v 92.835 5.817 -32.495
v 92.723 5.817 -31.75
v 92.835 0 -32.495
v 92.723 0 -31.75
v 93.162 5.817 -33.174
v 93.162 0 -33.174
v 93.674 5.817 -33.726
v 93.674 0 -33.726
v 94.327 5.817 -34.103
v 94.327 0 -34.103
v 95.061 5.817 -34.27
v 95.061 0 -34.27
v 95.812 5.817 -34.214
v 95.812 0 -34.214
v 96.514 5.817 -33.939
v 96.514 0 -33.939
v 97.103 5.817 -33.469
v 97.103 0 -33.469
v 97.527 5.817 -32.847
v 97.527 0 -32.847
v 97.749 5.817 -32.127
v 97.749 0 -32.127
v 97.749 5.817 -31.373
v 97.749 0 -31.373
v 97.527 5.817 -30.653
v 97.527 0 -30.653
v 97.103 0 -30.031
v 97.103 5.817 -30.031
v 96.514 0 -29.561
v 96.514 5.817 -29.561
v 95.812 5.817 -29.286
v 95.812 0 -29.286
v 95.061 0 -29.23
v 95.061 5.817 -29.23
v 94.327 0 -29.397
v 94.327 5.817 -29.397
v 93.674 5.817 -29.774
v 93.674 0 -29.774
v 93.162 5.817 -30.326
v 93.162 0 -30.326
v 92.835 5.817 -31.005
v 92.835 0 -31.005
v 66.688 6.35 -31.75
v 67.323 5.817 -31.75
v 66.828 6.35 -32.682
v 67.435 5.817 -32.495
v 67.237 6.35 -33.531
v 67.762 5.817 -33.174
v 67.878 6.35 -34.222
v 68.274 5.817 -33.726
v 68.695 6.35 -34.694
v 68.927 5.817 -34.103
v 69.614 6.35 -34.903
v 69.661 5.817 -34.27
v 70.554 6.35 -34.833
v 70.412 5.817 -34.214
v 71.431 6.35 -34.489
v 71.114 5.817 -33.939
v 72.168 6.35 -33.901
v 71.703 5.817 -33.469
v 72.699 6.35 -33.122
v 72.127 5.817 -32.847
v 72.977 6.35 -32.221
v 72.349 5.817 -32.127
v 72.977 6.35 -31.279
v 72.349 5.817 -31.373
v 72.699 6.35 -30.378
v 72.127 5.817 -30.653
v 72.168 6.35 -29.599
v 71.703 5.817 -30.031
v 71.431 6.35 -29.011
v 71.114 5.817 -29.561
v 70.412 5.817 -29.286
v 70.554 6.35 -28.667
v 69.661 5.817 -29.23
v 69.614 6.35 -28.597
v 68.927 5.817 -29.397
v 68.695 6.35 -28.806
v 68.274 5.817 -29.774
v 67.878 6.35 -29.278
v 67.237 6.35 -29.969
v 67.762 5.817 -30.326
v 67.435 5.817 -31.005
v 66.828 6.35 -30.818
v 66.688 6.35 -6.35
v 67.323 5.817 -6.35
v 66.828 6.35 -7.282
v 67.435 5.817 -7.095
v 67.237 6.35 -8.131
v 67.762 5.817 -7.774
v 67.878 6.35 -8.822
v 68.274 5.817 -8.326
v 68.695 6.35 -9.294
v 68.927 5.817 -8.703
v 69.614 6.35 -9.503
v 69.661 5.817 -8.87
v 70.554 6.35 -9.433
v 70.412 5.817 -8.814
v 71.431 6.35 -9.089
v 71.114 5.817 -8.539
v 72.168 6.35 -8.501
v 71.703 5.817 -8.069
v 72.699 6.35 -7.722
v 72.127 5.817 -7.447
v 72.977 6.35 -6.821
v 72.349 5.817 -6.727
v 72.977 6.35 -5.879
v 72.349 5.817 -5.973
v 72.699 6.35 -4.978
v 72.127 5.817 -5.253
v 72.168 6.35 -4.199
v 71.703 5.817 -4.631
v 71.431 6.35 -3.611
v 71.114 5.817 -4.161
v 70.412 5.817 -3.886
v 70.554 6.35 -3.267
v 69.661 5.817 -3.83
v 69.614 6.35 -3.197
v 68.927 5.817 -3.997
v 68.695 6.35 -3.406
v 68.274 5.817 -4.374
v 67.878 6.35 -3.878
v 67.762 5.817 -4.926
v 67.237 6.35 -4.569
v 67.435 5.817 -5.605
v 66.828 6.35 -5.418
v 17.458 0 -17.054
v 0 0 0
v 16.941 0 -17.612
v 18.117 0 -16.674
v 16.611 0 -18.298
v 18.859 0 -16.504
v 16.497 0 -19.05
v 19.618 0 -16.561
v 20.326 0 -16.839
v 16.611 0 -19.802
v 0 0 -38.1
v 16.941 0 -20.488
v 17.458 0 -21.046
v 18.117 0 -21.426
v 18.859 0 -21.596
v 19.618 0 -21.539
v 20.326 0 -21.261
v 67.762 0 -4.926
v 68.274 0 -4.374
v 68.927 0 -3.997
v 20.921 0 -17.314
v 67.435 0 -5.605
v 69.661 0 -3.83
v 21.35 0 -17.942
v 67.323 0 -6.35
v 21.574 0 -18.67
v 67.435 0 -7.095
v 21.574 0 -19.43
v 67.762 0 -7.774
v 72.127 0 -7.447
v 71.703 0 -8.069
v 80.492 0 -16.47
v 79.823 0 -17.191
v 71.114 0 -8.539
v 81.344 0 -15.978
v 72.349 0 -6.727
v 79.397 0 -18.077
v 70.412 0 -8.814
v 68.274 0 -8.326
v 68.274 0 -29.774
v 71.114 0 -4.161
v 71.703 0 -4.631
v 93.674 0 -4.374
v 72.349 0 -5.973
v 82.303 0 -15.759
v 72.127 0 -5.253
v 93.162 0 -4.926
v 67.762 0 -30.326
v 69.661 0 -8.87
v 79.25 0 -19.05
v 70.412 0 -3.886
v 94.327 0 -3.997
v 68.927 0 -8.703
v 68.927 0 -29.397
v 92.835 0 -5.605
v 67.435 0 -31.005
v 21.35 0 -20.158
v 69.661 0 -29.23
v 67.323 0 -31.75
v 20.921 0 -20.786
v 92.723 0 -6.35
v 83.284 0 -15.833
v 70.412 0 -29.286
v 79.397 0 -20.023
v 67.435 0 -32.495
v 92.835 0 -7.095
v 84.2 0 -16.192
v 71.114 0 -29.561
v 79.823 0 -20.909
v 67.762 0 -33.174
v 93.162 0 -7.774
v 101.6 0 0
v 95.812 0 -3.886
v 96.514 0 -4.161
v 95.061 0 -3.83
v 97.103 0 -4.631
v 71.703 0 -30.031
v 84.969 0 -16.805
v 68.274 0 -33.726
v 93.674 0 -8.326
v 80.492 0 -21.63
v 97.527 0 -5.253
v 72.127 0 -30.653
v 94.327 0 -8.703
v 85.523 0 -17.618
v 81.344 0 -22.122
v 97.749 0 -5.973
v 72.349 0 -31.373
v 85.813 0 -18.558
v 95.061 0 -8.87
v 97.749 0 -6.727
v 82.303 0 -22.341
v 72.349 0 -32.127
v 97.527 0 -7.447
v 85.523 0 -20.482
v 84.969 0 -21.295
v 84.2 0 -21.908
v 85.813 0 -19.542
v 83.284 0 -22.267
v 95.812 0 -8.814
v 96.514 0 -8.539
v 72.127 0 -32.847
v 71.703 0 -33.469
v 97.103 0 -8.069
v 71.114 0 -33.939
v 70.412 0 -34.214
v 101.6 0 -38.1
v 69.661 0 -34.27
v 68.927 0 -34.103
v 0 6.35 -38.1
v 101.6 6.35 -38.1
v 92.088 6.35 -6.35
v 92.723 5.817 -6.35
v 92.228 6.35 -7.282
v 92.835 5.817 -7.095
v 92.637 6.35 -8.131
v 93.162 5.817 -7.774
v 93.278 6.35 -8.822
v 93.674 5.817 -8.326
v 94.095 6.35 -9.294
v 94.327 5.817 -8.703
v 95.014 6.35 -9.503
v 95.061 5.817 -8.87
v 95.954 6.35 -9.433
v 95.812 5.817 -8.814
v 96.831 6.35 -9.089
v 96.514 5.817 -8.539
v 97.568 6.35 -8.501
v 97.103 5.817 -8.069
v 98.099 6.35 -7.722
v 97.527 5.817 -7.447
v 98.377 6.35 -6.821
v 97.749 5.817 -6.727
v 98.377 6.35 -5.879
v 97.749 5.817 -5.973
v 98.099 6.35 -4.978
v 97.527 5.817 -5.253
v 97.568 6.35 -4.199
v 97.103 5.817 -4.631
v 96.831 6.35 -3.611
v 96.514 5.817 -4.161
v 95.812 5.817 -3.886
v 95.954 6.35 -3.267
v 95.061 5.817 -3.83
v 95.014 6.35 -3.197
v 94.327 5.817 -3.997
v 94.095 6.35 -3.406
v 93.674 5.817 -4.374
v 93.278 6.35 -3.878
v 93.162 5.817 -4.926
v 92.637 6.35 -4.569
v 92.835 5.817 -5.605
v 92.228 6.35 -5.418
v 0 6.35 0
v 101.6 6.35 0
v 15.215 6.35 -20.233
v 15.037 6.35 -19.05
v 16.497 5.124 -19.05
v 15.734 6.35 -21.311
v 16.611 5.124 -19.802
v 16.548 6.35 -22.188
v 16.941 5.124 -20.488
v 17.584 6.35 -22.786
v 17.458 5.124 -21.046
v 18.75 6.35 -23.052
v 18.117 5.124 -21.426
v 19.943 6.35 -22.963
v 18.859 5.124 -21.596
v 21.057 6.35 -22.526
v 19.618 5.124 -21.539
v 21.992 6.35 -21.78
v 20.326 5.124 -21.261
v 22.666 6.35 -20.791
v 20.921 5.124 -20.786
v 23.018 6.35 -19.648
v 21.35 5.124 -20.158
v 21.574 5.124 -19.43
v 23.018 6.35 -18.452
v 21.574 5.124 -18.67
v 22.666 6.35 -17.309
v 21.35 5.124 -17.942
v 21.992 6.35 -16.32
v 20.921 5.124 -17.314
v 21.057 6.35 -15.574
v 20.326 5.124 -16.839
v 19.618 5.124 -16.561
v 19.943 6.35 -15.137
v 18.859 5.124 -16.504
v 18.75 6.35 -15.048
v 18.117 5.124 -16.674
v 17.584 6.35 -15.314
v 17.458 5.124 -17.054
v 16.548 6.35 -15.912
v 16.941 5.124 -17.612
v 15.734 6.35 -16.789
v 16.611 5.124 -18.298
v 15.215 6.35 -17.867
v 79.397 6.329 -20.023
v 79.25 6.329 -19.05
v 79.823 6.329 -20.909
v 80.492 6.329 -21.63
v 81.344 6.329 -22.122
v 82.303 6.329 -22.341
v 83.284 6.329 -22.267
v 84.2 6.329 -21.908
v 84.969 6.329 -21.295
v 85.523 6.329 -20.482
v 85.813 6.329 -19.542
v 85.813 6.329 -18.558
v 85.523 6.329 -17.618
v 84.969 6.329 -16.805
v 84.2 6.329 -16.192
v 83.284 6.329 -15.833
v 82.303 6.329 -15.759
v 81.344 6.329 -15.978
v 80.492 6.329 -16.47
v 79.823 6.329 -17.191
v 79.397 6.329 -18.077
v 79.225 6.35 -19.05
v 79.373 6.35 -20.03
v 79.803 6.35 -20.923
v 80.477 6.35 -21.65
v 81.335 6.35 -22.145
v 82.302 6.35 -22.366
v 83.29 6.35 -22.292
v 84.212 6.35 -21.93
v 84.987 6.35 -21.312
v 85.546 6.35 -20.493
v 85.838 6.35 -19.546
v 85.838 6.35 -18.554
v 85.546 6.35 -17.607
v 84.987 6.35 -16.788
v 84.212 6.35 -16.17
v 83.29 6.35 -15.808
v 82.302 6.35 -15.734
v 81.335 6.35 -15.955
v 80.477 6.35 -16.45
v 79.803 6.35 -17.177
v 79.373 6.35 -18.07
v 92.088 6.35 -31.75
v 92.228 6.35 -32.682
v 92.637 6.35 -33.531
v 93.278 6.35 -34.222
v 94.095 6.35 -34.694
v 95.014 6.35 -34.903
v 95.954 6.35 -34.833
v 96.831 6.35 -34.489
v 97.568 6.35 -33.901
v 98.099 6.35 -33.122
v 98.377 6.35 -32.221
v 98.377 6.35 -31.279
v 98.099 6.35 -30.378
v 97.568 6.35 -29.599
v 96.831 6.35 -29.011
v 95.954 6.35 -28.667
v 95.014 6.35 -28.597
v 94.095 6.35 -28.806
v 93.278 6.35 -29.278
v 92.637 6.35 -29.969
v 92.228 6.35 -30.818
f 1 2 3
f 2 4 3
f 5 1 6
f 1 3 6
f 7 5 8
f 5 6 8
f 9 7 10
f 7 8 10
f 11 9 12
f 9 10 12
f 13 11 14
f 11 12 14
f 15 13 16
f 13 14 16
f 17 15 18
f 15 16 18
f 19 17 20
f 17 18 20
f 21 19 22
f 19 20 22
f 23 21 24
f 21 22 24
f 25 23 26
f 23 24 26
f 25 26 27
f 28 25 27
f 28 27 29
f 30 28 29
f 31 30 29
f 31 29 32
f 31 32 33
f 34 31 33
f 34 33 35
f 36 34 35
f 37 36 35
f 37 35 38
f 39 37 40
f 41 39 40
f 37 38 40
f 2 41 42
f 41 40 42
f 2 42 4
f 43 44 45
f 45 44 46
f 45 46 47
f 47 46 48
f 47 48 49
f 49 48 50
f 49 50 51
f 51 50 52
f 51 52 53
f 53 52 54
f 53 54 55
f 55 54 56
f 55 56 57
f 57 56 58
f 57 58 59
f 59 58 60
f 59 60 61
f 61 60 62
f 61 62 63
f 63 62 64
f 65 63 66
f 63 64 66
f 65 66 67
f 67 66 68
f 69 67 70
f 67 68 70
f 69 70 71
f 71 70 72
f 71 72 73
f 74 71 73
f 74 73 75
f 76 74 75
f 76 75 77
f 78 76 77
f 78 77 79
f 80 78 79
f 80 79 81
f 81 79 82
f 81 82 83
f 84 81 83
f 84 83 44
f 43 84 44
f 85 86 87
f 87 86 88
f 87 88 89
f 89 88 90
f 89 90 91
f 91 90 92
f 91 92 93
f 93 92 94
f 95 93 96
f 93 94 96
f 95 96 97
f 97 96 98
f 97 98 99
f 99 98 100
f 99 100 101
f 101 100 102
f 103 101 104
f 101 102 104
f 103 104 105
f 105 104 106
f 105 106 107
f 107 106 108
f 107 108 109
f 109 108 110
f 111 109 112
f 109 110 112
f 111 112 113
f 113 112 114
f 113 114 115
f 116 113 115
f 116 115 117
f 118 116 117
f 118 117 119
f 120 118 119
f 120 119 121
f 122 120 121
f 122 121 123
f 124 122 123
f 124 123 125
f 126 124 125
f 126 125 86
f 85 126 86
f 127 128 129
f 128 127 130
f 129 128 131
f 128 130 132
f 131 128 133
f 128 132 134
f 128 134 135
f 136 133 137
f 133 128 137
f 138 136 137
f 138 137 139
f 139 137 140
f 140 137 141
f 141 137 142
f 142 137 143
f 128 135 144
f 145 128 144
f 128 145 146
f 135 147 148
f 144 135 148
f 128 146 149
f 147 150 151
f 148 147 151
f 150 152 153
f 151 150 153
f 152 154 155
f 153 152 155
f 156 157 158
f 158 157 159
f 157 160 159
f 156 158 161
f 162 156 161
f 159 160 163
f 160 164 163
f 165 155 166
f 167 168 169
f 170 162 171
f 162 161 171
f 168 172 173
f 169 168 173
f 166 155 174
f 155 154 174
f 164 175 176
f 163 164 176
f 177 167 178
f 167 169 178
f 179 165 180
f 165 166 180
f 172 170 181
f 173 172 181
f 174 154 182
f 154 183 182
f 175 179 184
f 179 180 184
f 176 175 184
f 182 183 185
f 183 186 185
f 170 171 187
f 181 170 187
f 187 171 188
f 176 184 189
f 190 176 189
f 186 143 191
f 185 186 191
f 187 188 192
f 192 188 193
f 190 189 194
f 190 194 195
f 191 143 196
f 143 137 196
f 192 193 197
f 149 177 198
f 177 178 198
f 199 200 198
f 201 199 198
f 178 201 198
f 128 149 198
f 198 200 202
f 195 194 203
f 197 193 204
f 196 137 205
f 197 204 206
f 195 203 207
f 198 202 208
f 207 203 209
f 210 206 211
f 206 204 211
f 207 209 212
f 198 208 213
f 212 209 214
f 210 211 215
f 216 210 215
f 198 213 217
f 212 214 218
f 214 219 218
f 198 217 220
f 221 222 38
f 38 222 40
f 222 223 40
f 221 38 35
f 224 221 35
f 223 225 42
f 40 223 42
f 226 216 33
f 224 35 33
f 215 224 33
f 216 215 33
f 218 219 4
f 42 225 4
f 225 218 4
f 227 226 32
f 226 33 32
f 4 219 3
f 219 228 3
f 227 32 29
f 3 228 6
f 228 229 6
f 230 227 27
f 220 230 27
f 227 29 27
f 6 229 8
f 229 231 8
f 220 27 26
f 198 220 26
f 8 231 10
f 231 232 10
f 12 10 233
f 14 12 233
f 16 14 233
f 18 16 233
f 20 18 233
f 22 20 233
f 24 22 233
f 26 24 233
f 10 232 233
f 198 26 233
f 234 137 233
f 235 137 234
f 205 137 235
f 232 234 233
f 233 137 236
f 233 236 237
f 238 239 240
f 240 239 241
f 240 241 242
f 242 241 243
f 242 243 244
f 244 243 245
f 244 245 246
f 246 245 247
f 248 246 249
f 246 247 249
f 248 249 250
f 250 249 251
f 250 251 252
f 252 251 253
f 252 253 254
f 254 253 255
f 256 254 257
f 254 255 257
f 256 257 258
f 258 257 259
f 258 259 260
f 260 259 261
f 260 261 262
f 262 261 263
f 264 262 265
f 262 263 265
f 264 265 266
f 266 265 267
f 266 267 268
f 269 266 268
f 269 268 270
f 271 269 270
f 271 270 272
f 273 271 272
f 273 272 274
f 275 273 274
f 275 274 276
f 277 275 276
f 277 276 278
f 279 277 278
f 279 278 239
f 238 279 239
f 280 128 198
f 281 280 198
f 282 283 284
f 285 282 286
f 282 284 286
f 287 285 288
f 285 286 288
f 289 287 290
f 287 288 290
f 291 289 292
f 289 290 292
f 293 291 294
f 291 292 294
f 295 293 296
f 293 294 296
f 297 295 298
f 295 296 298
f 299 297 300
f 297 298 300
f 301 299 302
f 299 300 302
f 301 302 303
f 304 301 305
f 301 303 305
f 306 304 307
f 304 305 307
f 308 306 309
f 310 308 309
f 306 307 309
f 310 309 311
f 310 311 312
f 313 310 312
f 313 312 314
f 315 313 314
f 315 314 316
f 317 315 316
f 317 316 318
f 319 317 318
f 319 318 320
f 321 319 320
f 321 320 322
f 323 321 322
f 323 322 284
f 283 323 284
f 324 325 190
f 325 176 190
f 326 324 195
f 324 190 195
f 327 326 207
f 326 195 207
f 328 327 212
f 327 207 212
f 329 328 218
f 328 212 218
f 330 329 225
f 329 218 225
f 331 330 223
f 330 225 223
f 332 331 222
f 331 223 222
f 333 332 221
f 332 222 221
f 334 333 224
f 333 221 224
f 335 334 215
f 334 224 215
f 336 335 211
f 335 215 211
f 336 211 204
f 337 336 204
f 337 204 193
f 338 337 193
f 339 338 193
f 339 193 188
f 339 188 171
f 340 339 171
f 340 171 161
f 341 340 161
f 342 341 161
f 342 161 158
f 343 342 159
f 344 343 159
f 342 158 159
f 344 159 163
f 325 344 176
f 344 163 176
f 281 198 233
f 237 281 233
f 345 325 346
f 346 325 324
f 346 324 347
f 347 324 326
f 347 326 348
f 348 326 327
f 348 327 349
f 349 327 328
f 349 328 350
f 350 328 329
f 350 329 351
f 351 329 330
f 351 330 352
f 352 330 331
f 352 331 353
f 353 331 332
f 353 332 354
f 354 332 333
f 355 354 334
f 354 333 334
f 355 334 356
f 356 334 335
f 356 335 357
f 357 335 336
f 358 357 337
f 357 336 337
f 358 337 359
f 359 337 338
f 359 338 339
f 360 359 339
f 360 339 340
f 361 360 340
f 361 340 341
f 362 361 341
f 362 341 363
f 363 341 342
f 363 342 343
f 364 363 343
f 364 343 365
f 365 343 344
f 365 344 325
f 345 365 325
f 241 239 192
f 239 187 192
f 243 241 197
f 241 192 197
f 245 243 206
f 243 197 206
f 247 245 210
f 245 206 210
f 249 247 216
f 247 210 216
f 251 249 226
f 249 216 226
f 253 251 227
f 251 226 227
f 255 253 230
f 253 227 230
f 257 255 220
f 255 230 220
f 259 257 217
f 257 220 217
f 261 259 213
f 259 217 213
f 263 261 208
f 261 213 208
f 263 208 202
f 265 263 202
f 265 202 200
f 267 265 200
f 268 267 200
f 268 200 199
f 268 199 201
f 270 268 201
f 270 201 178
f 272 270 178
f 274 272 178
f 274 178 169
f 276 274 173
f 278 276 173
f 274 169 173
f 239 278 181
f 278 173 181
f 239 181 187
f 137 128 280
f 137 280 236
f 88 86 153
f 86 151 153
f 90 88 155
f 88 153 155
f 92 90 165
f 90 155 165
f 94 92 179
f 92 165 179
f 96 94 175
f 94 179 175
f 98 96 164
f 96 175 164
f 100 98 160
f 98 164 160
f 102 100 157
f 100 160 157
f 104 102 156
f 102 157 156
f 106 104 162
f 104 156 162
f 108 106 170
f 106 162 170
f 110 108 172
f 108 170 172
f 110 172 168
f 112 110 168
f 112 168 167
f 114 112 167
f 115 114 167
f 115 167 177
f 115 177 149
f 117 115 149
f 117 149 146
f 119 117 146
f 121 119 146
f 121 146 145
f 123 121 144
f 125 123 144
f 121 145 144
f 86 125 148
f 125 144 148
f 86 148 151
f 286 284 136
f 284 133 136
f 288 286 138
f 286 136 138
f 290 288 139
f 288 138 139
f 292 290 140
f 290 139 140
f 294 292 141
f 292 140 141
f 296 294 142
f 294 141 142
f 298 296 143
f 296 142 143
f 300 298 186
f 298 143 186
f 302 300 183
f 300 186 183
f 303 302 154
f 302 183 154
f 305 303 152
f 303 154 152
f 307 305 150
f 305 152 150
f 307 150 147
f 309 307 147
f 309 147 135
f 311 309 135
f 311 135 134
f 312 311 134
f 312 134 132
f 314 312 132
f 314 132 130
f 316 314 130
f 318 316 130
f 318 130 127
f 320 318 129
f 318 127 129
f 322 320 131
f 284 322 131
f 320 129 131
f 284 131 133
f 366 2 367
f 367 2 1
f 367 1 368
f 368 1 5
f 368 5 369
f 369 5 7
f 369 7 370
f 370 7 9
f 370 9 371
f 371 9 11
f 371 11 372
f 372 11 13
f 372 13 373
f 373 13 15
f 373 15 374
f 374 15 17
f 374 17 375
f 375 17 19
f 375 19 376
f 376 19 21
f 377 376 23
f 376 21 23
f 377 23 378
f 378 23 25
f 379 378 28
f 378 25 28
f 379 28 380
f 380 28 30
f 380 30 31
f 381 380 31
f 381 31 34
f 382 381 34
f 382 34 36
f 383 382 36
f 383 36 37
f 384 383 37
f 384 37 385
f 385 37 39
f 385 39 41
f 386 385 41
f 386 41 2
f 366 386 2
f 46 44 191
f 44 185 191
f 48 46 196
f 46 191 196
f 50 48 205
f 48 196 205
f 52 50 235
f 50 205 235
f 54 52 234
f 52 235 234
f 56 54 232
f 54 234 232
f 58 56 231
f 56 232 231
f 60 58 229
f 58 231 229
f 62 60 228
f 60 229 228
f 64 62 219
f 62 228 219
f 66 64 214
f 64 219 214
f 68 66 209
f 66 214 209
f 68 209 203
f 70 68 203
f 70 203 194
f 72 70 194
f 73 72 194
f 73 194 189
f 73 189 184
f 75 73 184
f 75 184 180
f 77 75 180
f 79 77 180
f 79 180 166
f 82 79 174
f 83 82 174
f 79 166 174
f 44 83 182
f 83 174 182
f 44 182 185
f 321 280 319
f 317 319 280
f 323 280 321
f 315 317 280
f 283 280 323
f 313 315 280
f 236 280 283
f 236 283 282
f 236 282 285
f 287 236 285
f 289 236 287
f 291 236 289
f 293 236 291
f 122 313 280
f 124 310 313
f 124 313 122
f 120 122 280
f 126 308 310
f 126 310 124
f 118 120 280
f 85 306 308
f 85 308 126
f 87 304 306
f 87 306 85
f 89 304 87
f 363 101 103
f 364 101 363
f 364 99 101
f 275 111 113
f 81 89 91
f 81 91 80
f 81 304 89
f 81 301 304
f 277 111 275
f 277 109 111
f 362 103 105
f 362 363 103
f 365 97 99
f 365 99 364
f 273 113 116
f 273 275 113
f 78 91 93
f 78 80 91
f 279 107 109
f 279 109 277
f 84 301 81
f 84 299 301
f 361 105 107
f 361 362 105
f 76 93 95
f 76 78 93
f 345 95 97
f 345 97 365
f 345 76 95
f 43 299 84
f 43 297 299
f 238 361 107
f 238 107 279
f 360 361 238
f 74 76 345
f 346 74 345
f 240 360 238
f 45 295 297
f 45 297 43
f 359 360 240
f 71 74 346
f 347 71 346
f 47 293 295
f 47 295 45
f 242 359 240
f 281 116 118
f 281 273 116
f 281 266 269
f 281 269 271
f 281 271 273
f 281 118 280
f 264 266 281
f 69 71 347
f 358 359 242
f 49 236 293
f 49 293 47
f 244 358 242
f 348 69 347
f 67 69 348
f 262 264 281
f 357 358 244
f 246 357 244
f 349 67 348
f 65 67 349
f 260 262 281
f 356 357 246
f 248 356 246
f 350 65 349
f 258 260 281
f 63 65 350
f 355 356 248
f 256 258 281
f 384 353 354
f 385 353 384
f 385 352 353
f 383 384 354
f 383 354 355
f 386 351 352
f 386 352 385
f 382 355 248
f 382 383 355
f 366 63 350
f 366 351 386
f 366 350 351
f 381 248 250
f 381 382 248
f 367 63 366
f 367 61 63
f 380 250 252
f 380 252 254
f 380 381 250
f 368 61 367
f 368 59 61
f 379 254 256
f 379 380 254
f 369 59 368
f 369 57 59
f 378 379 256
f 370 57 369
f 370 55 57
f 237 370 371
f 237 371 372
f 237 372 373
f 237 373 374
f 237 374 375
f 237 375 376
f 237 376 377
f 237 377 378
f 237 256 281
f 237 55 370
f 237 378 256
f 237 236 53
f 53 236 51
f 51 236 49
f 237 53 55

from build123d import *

# Parameters (mm, degrees)
SKETCH1_W                            = 101.6
SKETCH1_H                            = 38.1
BOSS_EXTRUDE1_DEPTH                  = 6.35
F_1_4_20_TAPPED_HOLE1_D              = 5.1054
F_1_4_20_TAPPED_HOLE1_CSINK_D        = 8.0264
F_1_4_20_TAPPED_HOLE1_CSINK_ANGLE    = 100
M6_CLEARANCE_HOLE1_D                 = 6.6
M6_CLEARANCE_HOLE1_CSINK_D           = 6.65
M6_CLEARANCE_HOLE1_CSINK_ANGLE       = 100
F_8_0_199_DIAMETER_HOLE1_D           = 5.0546
F_8_0_199_DIAMETER_HOLE1_CSINK_D     = 6.3246
F_8_0_199_DIAMETER_HOLE1_CSINK_ANGLE = 100


with BuildPart() as part:
    # Sketch1 → Boss-Extrude1 (new body)
    with BuildSketch(Plane(origin=(0, 0, 0), x_dir=(1, 0, 0), z_dir=(0, 1, 0))):
        with Locations((50.8, 19.05)):
            Rectangle(SKETCH1_W, SKETCH1_H)
    extrude(amount=BOSS_EXTRUDE1_DEPTH)

    # 1/4-20 Tapped Hole1 (through all)
    with Locations(Plane(origin=(0, 6.35, 0), x_dir=(1, 0, 0), z_dir=(0, 1, 0))):
        with Locations((19.05, 19.05)):
            CounterSinkHole(F_1_4_20_TAPPED_HOLE1_D / 2, F_1_4_20_TAPPED_HOLE1_CSINK_D / 2, counter_sink_angle=F_1_4_20_TAPPED_HOLE1_CSINK_ANGLE)

    # M6 Clearance Hole1 (through all)
    with Locations(Plane(origin=(0, 6.35, 0), x_dir=(1, 0, 0), z_dir=(0, 1, 0))):
        with Locations((82.55, 19.05)):
            CounterSinkHole(M6_CLEARANCE_HOLE1_D / 2, M6_CLEARANCE_HOLE1_CSINK_D / 2, counter_sink_angle=M6_CLEARANCE_HOLE1_CSINK_ANGLE)

    # #8 (0.199) Diameter Hole1 (through all)
    with Locations(Plane(origin=(0, 6.35, 0), x_dir=(1, 0, 0), z_dir=(0, 1, 0))):
        with Locations((95.25, 31.75), (69.85, 31.75), (69.85, 6.35), (95.25, 6.35)):
            CounterSinkHole(F_8_0_199_DIAMETER_HOLE1_D / 2, F_8_0_199_DIAMETER_HOLE1_CSINK_D / 2, counter_sink_angle=F_8_0_199_DIAMETER_HOLE1_CSINK_ANGLE)


solid = part.part
